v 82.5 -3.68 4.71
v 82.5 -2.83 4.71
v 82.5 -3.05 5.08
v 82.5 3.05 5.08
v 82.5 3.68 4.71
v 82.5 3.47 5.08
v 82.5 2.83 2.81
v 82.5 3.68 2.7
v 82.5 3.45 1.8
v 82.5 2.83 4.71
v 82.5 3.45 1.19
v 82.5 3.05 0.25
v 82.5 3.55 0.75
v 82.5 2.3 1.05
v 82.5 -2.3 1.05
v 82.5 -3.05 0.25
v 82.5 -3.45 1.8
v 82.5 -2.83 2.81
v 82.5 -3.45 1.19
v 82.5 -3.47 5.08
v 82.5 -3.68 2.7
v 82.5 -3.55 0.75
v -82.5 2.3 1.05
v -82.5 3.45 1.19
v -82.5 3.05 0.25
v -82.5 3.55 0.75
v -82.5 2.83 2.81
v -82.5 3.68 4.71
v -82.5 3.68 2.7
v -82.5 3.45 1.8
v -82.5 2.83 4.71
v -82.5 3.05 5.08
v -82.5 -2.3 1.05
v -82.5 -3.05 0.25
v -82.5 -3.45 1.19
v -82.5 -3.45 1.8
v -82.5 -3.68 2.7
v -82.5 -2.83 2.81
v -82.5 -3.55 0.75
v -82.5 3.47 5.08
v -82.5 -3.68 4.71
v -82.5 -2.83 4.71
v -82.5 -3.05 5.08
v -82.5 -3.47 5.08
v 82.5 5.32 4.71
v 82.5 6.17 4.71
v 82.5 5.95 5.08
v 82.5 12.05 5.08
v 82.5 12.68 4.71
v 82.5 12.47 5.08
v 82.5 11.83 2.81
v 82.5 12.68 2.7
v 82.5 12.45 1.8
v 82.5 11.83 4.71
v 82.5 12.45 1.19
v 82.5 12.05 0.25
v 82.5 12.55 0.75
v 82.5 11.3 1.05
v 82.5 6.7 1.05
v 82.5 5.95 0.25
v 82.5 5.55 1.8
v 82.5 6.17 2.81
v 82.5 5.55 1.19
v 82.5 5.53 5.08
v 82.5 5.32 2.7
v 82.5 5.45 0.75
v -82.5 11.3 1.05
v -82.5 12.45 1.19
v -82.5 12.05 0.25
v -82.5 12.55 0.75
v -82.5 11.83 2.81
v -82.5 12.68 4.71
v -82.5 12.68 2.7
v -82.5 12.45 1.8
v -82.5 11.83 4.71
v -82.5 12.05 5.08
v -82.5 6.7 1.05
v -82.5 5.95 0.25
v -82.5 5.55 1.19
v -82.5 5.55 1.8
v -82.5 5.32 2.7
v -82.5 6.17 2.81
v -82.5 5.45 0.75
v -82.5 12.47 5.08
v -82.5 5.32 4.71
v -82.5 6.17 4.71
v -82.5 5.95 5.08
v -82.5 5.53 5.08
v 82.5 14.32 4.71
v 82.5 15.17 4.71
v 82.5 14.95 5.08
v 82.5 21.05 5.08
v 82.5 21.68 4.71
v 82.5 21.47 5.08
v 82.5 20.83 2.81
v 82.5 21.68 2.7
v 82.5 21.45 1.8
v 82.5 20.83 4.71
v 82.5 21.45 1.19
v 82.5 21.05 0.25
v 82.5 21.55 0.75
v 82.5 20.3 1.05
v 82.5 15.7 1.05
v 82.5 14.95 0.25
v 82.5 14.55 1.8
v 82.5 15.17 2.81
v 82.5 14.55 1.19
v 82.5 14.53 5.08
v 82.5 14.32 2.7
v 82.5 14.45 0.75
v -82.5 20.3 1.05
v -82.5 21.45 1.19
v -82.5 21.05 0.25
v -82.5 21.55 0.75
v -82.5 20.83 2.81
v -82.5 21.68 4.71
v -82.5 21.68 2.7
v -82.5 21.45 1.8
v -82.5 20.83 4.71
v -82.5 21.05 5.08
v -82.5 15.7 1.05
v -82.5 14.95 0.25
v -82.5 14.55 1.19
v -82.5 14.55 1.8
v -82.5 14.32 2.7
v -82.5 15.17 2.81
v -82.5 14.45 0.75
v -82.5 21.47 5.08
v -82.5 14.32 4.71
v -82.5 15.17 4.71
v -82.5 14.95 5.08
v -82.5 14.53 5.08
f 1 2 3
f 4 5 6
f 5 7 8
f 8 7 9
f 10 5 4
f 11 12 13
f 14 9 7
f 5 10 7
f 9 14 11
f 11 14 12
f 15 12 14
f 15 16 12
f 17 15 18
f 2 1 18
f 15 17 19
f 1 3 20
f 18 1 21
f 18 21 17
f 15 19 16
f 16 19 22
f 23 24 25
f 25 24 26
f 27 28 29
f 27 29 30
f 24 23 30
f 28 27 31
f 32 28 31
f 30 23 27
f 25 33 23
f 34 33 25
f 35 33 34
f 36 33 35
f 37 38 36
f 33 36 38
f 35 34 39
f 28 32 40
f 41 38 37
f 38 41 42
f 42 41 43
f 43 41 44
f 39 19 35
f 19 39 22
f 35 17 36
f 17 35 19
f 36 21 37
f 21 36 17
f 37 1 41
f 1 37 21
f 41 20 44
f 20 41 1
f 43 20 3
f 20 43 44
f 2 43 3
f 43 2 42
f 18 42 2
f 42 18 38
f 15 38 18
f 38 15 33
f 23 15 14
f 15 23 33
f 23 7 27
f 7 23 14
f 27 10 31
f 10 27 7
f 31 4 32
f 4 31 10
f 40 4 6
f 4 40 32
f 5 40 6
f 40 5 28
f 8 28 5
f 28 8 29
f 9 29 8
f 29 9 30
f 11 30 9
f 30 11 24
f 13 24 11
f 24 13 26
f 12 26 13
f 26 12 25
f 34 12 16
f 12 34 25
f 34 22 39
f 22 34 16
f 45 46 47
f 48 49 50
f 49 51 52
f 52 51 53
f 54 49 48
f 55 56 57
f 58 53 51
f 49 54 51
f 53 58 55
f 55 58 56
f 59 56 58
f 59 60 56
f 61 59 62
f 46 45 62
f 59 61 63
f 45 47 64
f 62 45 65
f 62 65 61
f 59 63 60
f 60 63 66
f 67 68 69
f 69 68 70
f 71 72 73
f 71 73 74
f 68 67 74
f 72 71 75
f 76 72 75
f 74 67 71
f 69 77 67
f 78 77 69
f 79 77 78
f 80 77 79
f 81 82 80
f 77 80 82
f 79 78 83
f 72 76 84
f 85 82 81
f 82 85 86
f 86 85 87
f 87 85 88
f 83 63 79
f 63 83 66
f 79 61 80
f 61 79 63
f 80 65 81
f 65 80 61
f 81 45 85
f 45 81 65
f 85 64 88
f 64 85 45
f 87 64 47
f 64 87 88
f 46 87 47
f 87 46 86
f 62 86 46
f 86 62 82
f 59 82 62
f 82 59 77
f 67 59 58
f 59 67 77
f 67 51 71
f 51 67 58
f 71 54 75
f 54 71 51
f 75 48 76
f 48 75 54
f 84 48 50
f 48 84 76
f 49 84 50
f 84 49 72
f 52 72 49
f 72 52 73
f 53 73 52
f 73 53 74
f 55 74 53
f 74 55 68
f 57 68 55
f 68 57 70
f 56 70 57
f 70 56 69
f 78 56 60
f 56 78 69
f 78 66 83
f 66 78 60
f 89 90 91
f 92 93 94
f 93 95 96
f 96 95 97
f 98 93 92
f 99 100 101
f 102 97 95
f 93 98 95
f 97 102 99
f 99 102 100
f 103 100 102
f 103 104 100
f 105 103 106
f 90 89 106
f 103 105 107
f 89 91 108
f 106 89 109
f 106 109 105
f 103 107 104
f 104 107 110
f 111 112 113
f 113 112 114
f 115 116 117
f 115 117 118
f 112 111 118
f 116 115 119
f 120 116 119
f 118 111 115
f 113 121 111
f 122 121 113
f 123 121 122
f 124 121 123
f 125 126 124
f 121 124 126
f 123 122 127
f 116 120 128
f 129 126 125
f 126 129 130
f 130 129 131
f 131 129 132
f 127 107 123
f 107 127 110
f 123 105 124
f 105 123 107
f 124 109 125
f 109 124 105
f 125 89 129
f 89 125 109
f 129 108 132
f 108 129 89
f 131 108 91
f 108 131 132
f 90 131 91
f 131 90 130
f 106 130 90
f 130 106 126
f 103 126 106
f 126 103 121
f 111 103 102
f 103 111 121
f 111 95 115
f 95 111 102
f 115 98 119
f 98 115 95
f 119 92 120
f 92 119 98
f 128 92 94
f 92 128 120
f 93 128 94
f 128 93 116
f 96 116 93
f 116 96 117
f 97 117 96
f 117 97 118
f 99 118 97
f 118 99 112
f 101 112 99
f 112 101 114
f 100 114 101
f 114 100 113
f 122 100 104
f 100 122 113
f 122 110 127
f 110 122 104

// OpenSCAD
//Remix of V-Slot cover for adjustable fit
//2/16/2019 By David Bunch
//Remixed from: https://www.thingiverse.com/thing:832077
//
Test = 0;           //0 = Final Print,  1 = Test Print
Len = 165;          //165 * 3 = 495mm
Qty = 3;
Gap = 3.1;          //3.1 = 1/2 Dimensioned Gap distance where channel connects to V-Slot

V1 = 0.05;           //Thickness at V connection
                    //0.1 would be tighter fit, -0.1 would be looser fit
                    //-.1 works best for me
Z1 =  .25;

A_T1 = [.05, .025, 0, -.025 -.05, -.075];      //Used for Test print
Test_Qty = len(A_T1);
echo(Test_Qty = Test_Qty);
module V2020(V_Ht = Len)
{
    rotate([0,-90,0])
    rotate([0,0,-90])
    translate([0,10,0])
    difference()
    {
        linear_extrude(height = V_Ht, center = false, convexity = 10)polygon(points = 
    [[-3.9,-2.84],[-3.9,2.84],[-6.56,5.5],[-8.2,5.5],[-8.2,3.13],
    [-8.55,3.13],[-10,4.58],[-10,10],[-4.58,10],[-3.13,8.55],
    [-3.13,8.2],[-5.5,8.2],[-5.5,6.56],[-2.84,3.9],[2.84,3.9],
    [5.5,6.56],[5.5,8.2],[3.13,8.2],[3.13,8.55],[4.58,10],
    [10,10],[10,4.58],[8.55,3.13],[8.2,3.13],[8.2,5.5],
    [6.56,5.5],[3.9,2.84],[3.9,-2.84],[6.56,-5.5],[8.2,-5.5],
    [8.2,-3.13],[8.55,-3.13],[10,-4.58],[10,-10],[4.58,-10],
    [3.13,-8.55],[3.13,-8.2],[5.5,-8.2],[5.5,-6.56],[2.84,-3.9],
    [-2.84,-3.9],[-5.5,-6.56],[-5.5,-8.2],[-3.13,-8.2],[-3.13,-8.55],
    [-4.58,-10],[-10,-10],[-10,-4.58],[-8.55,-3.13],[-8.2,-3.13],
    [-8.2,-5.5],[-6.56,-5.5]]);
        translate([0,0,-1])
        cylinder(d=4.2,h=V_Ht+2,center=false,$fn=16);
    }
}
module Cbeam(V_Ht = Len)
{
    rotate([0,-90,0])
    rotate([0,0,-90])
    translate([0,10,0])
    difference()
    {
    linear_extrude(height = V_Ht, center = false, convexity = 10)polygon(points = 
    [[14.5,-8.2],[14.5,-6.56],[17.16,-3.9],[22.84,-3.9],[25.5,-6.56],
    [25.5,-8.2],[23.4,-8.2],[23.4,-8.82],[24.58,-10],[28.5,-10],
    [29.07,-9.89],[29.56,-9.56],[29.89,-9.07],[30,-8.5],[30,-4.58],
    [28.82,-3.4],[28.2,-3.4],[28.2,-5.5],[26.56,-5.5],[23.9,-2.84],
    [23.9,2.84],[26.56,5.5],[28.2,5.5],[28.2,3.4],[28.82,3.4],
    [30,4.58],[30,8.5],[29.89,9.07],[29.56,9.56],[29.07,9.89],
    [28.5,10],[24.58,10],[23.4,8.82],[23.4,8.2],[25.5,8.2],
    [25.5,6.56],[22.84,3.9],[17.16,3.9],[14.5,6.56],[14.5,8.2],
    [16.61,8.2],[16.61,8.82],[15.42,10],[10,10],[10,15.42],
    [8.82,16.61],[8.2,16.61],[8.2,14.5],[6.56,14.5],[3.9,17.16],
    [3.9,22.84],[6.56,25.5],[8.2,25.5],[8.2,23.4],[8.82,23.4],
    [10,24.58],[10,35.42],[8.82,36.61],[8.2,36.61],[8.2,34.5],
    [6.56,34.5],[3.9,37.16],[3.9,42.84],[6.56,45.5],[8.2,45.5],
    [8.2,43.4],[8.82,43.4],[10,44.58],[10,50],[15.42,50],
    [16.61,51.19],[16.61,51.8],[14.5,51.8],[14.5,53.44],[17.16,56.1],
    [22.84,56.1],[25.5,53.44],[25.5,51.8],[23.4,51.8],[23.4,51.19],
    [24.58,50],[28.5,50],[29.07,50.11],[29.56,50.44],[29.89,50.93],
    [30,51.5],[30,55.42],[28.82,56.61],[28.2,56.61],[28.2,54.5],
    [26.56,54.5],[23.9,57.16],[23.9,62.84],[26.56,65.5],[28.2,65.5],
    [28.2,63.4],[28.82,63.4],[30,64.58],[30,68.5],[29.89,69.07],
    [29.56,69.56],[29.07,69.89],[28.5,70],[24.58,70],[23.4,68.82],
    [23.4,68.2],[25.5,68.2],[25.5,66.56],[22.84,63.9],[17.16,63.9],
    [14.5,66.56],[14.5,68.2],[16.61,68.2],[16.61,68.82],[15.42,70],
    [4.58,70],[3.4,68.82],[3.4,68.2],[5.5,68.2],[5.5,66.56],
    [2.84,63.9],[-2.84,63.9],[-5.5,66.56],[-5.5,68.2],[-3.4,68.2],
    [-3.4,68.82],[-4.58,70],[-8.5,70],[-9.07,69.89],[-9.56,69.56],
    [-9.89,69.07],[-10,68.5],[-10,64.58],[-8.82,63.4],[-8.2,63.4],
    [-8.2,65.5],[-6.56,65.5],[-3.9,62.84],[-3.9,57.16],[-6.56,54.5],
    [-8.2,54.5],[-8.2,56.61],[-8.82,56.61],[-10,55.42],[-10,44.58],
    [-8.82,43.4],[-8.2,43.4],[-8.2,45.5],[-6.56,45.5],[-3.9,42.84],
    [-3.9,37.16],[-6.56,34.5],[-8.2,34.5],[-8.2,36.61],[-8.82,36.61],
    [-10,35.42],[-10,24.58],[-8.82,23.4],[-8.2,23.4],[-8.2,25.5],
    [-6.56,25.5],[-3.9,22.84],[-3.9,17.16],[-6.56,14.5],[-8.2,14.5],
    [-8.2,16.61],[-8.82,16.61],[-10,15.42],[-10,4.58],[-8.82,3.4],
    [-8.2,3.4],[-8.2,5.5],[-6.56,5.5],[-3.9,2.84],[-3.9,-2.84],
    [-6.56,-5.5],[-8.2,-5.5],[-8.2,-3.4],[-8.82,-3.4],[-10,-4.58],
    [-10,-8.5],[-9.89,-9.07],[-9.56,-9.56],[-9.07,-9.89],[-8.5,-10],
    [-4.58,-10],[-3.4,-8.82],[-3.4,-8.2],[-5.5,-8.2],[-5.5,-6.56],
    [-2.84,-3.9],[2.84,-3.9],[5.5,-6.56],[5.5,-8.2],[3.4,-8.2],
    [3.4,-8.82],[4.58,-10],[15.42,-10],[16.61,-8.82],[16.61,-8.2],
    [14.5,-8.2]]);
    for (y = [0,1])
    {
        translate([0,y*40,0])
        mirror([y,0,0])
        translate([0,0,-1])
        linear_extrude(height = V_Ht+2, center = false, convexity = 10)polygon(points = 
        [[-5.94,13],[-2.84,16.1],[2.84,16.1],[5.94,13],[8.2,13],
        [8.2,9.26],[2.84,3.9],[-2.84,3.9],[-5.94,7],[-8.2,7],
        [-8.2,13]]);
        translate([0,y*60,0])
        mirror([0,y,0])
        translate([0,0,-1])
        linear_extrude(height = V_Ht+2, center = false, convexity = 10)polygon(points = 
        [[16.1,2.84],[13,5.94],[13,8.2],[9.26,8.2],[3.9,2.84],
        [3.9,-2.84],[7,-5.94],[7,-8.2],[13,-8.2],[13,-5.94],
        [16.1,-2.84],[16.1,2.84]]);
    }
        translate([0,0,-1])
        linear_extrude(height = V_Ht+2, center = false, convexity = 10)polygon(points = 
        [[-2.84,23.9],[-5.94,27],[-8.2,27],[-8.2,33],[-5.94,33],
        [-2.84,36.1],[2.84,36.1],[5.94,33],[8.2,33],[8.2,27],
        [5.94,27],[2.84,23.9]]);
        for (y = [0,20,40,60])
        {
            translate([0,y,-1])
            cylinder(d=4.2,h=V_Ht+2,center=false,$fn=16);
        }
        for (y = [0,60])
        {
            translate([20,y,-1])
            cylinder(d=4.2,h=V_Ht+2,center=false,$fn=16);
        }
    }
}

module Channel(T1 = -.1, Y1 = Z1)
{
    X1 = Gap + T1;
    echo(X1 = X1);
    echo(X1 * 2);
    rotate([0,-90,0])
    rotate([0,0,-90])
    linear_extrude(height = Len, center = false, convexity = 10)polygon(points = 
    [[-3.4-T1,1.8],[-3.63-T1,2.7],[-3.63-T1,4.71],[-3.42-T1,5.08],[-3-T1,5.08],
    [-2.78-T1,4.71],[-2.78-T1,2.81],[-2.25-T1,0.8+Y1],[2.25+T1,0.8+Y1],[2.78+T1,2.81],
    [2.78+T1,4.71],[3+T1,5.08],[3.42+T1,5.08],[3.63+T1,4.71],[3.63+T1,2.7],
    [3.4+T1,1.8],[3.4+T1,1.19],[3.5++T1,0.5+Y1],[3+T1,Y1],[-3-T1,Y1],
    [-3.5-T1,0.5+Y1],[-3.4-T1,1.19]]);
}
if (Test == 0)
{
    translate([Len/2,0,0])
    %Cbeam();
    for (i = [0:Qty-1])
    {
        translate([Len/2,i * 9,0])
        Channel(V1,Z1);
    }
} else if (Test == 1)
{
    translate([Len/2,0,0])
%Cbeam();
    for (i = [0:Test_Qty-1])
    {
        translate([Len/2,i * 9,0])
        Channel(A_T1[i],Z1);
    }
}
